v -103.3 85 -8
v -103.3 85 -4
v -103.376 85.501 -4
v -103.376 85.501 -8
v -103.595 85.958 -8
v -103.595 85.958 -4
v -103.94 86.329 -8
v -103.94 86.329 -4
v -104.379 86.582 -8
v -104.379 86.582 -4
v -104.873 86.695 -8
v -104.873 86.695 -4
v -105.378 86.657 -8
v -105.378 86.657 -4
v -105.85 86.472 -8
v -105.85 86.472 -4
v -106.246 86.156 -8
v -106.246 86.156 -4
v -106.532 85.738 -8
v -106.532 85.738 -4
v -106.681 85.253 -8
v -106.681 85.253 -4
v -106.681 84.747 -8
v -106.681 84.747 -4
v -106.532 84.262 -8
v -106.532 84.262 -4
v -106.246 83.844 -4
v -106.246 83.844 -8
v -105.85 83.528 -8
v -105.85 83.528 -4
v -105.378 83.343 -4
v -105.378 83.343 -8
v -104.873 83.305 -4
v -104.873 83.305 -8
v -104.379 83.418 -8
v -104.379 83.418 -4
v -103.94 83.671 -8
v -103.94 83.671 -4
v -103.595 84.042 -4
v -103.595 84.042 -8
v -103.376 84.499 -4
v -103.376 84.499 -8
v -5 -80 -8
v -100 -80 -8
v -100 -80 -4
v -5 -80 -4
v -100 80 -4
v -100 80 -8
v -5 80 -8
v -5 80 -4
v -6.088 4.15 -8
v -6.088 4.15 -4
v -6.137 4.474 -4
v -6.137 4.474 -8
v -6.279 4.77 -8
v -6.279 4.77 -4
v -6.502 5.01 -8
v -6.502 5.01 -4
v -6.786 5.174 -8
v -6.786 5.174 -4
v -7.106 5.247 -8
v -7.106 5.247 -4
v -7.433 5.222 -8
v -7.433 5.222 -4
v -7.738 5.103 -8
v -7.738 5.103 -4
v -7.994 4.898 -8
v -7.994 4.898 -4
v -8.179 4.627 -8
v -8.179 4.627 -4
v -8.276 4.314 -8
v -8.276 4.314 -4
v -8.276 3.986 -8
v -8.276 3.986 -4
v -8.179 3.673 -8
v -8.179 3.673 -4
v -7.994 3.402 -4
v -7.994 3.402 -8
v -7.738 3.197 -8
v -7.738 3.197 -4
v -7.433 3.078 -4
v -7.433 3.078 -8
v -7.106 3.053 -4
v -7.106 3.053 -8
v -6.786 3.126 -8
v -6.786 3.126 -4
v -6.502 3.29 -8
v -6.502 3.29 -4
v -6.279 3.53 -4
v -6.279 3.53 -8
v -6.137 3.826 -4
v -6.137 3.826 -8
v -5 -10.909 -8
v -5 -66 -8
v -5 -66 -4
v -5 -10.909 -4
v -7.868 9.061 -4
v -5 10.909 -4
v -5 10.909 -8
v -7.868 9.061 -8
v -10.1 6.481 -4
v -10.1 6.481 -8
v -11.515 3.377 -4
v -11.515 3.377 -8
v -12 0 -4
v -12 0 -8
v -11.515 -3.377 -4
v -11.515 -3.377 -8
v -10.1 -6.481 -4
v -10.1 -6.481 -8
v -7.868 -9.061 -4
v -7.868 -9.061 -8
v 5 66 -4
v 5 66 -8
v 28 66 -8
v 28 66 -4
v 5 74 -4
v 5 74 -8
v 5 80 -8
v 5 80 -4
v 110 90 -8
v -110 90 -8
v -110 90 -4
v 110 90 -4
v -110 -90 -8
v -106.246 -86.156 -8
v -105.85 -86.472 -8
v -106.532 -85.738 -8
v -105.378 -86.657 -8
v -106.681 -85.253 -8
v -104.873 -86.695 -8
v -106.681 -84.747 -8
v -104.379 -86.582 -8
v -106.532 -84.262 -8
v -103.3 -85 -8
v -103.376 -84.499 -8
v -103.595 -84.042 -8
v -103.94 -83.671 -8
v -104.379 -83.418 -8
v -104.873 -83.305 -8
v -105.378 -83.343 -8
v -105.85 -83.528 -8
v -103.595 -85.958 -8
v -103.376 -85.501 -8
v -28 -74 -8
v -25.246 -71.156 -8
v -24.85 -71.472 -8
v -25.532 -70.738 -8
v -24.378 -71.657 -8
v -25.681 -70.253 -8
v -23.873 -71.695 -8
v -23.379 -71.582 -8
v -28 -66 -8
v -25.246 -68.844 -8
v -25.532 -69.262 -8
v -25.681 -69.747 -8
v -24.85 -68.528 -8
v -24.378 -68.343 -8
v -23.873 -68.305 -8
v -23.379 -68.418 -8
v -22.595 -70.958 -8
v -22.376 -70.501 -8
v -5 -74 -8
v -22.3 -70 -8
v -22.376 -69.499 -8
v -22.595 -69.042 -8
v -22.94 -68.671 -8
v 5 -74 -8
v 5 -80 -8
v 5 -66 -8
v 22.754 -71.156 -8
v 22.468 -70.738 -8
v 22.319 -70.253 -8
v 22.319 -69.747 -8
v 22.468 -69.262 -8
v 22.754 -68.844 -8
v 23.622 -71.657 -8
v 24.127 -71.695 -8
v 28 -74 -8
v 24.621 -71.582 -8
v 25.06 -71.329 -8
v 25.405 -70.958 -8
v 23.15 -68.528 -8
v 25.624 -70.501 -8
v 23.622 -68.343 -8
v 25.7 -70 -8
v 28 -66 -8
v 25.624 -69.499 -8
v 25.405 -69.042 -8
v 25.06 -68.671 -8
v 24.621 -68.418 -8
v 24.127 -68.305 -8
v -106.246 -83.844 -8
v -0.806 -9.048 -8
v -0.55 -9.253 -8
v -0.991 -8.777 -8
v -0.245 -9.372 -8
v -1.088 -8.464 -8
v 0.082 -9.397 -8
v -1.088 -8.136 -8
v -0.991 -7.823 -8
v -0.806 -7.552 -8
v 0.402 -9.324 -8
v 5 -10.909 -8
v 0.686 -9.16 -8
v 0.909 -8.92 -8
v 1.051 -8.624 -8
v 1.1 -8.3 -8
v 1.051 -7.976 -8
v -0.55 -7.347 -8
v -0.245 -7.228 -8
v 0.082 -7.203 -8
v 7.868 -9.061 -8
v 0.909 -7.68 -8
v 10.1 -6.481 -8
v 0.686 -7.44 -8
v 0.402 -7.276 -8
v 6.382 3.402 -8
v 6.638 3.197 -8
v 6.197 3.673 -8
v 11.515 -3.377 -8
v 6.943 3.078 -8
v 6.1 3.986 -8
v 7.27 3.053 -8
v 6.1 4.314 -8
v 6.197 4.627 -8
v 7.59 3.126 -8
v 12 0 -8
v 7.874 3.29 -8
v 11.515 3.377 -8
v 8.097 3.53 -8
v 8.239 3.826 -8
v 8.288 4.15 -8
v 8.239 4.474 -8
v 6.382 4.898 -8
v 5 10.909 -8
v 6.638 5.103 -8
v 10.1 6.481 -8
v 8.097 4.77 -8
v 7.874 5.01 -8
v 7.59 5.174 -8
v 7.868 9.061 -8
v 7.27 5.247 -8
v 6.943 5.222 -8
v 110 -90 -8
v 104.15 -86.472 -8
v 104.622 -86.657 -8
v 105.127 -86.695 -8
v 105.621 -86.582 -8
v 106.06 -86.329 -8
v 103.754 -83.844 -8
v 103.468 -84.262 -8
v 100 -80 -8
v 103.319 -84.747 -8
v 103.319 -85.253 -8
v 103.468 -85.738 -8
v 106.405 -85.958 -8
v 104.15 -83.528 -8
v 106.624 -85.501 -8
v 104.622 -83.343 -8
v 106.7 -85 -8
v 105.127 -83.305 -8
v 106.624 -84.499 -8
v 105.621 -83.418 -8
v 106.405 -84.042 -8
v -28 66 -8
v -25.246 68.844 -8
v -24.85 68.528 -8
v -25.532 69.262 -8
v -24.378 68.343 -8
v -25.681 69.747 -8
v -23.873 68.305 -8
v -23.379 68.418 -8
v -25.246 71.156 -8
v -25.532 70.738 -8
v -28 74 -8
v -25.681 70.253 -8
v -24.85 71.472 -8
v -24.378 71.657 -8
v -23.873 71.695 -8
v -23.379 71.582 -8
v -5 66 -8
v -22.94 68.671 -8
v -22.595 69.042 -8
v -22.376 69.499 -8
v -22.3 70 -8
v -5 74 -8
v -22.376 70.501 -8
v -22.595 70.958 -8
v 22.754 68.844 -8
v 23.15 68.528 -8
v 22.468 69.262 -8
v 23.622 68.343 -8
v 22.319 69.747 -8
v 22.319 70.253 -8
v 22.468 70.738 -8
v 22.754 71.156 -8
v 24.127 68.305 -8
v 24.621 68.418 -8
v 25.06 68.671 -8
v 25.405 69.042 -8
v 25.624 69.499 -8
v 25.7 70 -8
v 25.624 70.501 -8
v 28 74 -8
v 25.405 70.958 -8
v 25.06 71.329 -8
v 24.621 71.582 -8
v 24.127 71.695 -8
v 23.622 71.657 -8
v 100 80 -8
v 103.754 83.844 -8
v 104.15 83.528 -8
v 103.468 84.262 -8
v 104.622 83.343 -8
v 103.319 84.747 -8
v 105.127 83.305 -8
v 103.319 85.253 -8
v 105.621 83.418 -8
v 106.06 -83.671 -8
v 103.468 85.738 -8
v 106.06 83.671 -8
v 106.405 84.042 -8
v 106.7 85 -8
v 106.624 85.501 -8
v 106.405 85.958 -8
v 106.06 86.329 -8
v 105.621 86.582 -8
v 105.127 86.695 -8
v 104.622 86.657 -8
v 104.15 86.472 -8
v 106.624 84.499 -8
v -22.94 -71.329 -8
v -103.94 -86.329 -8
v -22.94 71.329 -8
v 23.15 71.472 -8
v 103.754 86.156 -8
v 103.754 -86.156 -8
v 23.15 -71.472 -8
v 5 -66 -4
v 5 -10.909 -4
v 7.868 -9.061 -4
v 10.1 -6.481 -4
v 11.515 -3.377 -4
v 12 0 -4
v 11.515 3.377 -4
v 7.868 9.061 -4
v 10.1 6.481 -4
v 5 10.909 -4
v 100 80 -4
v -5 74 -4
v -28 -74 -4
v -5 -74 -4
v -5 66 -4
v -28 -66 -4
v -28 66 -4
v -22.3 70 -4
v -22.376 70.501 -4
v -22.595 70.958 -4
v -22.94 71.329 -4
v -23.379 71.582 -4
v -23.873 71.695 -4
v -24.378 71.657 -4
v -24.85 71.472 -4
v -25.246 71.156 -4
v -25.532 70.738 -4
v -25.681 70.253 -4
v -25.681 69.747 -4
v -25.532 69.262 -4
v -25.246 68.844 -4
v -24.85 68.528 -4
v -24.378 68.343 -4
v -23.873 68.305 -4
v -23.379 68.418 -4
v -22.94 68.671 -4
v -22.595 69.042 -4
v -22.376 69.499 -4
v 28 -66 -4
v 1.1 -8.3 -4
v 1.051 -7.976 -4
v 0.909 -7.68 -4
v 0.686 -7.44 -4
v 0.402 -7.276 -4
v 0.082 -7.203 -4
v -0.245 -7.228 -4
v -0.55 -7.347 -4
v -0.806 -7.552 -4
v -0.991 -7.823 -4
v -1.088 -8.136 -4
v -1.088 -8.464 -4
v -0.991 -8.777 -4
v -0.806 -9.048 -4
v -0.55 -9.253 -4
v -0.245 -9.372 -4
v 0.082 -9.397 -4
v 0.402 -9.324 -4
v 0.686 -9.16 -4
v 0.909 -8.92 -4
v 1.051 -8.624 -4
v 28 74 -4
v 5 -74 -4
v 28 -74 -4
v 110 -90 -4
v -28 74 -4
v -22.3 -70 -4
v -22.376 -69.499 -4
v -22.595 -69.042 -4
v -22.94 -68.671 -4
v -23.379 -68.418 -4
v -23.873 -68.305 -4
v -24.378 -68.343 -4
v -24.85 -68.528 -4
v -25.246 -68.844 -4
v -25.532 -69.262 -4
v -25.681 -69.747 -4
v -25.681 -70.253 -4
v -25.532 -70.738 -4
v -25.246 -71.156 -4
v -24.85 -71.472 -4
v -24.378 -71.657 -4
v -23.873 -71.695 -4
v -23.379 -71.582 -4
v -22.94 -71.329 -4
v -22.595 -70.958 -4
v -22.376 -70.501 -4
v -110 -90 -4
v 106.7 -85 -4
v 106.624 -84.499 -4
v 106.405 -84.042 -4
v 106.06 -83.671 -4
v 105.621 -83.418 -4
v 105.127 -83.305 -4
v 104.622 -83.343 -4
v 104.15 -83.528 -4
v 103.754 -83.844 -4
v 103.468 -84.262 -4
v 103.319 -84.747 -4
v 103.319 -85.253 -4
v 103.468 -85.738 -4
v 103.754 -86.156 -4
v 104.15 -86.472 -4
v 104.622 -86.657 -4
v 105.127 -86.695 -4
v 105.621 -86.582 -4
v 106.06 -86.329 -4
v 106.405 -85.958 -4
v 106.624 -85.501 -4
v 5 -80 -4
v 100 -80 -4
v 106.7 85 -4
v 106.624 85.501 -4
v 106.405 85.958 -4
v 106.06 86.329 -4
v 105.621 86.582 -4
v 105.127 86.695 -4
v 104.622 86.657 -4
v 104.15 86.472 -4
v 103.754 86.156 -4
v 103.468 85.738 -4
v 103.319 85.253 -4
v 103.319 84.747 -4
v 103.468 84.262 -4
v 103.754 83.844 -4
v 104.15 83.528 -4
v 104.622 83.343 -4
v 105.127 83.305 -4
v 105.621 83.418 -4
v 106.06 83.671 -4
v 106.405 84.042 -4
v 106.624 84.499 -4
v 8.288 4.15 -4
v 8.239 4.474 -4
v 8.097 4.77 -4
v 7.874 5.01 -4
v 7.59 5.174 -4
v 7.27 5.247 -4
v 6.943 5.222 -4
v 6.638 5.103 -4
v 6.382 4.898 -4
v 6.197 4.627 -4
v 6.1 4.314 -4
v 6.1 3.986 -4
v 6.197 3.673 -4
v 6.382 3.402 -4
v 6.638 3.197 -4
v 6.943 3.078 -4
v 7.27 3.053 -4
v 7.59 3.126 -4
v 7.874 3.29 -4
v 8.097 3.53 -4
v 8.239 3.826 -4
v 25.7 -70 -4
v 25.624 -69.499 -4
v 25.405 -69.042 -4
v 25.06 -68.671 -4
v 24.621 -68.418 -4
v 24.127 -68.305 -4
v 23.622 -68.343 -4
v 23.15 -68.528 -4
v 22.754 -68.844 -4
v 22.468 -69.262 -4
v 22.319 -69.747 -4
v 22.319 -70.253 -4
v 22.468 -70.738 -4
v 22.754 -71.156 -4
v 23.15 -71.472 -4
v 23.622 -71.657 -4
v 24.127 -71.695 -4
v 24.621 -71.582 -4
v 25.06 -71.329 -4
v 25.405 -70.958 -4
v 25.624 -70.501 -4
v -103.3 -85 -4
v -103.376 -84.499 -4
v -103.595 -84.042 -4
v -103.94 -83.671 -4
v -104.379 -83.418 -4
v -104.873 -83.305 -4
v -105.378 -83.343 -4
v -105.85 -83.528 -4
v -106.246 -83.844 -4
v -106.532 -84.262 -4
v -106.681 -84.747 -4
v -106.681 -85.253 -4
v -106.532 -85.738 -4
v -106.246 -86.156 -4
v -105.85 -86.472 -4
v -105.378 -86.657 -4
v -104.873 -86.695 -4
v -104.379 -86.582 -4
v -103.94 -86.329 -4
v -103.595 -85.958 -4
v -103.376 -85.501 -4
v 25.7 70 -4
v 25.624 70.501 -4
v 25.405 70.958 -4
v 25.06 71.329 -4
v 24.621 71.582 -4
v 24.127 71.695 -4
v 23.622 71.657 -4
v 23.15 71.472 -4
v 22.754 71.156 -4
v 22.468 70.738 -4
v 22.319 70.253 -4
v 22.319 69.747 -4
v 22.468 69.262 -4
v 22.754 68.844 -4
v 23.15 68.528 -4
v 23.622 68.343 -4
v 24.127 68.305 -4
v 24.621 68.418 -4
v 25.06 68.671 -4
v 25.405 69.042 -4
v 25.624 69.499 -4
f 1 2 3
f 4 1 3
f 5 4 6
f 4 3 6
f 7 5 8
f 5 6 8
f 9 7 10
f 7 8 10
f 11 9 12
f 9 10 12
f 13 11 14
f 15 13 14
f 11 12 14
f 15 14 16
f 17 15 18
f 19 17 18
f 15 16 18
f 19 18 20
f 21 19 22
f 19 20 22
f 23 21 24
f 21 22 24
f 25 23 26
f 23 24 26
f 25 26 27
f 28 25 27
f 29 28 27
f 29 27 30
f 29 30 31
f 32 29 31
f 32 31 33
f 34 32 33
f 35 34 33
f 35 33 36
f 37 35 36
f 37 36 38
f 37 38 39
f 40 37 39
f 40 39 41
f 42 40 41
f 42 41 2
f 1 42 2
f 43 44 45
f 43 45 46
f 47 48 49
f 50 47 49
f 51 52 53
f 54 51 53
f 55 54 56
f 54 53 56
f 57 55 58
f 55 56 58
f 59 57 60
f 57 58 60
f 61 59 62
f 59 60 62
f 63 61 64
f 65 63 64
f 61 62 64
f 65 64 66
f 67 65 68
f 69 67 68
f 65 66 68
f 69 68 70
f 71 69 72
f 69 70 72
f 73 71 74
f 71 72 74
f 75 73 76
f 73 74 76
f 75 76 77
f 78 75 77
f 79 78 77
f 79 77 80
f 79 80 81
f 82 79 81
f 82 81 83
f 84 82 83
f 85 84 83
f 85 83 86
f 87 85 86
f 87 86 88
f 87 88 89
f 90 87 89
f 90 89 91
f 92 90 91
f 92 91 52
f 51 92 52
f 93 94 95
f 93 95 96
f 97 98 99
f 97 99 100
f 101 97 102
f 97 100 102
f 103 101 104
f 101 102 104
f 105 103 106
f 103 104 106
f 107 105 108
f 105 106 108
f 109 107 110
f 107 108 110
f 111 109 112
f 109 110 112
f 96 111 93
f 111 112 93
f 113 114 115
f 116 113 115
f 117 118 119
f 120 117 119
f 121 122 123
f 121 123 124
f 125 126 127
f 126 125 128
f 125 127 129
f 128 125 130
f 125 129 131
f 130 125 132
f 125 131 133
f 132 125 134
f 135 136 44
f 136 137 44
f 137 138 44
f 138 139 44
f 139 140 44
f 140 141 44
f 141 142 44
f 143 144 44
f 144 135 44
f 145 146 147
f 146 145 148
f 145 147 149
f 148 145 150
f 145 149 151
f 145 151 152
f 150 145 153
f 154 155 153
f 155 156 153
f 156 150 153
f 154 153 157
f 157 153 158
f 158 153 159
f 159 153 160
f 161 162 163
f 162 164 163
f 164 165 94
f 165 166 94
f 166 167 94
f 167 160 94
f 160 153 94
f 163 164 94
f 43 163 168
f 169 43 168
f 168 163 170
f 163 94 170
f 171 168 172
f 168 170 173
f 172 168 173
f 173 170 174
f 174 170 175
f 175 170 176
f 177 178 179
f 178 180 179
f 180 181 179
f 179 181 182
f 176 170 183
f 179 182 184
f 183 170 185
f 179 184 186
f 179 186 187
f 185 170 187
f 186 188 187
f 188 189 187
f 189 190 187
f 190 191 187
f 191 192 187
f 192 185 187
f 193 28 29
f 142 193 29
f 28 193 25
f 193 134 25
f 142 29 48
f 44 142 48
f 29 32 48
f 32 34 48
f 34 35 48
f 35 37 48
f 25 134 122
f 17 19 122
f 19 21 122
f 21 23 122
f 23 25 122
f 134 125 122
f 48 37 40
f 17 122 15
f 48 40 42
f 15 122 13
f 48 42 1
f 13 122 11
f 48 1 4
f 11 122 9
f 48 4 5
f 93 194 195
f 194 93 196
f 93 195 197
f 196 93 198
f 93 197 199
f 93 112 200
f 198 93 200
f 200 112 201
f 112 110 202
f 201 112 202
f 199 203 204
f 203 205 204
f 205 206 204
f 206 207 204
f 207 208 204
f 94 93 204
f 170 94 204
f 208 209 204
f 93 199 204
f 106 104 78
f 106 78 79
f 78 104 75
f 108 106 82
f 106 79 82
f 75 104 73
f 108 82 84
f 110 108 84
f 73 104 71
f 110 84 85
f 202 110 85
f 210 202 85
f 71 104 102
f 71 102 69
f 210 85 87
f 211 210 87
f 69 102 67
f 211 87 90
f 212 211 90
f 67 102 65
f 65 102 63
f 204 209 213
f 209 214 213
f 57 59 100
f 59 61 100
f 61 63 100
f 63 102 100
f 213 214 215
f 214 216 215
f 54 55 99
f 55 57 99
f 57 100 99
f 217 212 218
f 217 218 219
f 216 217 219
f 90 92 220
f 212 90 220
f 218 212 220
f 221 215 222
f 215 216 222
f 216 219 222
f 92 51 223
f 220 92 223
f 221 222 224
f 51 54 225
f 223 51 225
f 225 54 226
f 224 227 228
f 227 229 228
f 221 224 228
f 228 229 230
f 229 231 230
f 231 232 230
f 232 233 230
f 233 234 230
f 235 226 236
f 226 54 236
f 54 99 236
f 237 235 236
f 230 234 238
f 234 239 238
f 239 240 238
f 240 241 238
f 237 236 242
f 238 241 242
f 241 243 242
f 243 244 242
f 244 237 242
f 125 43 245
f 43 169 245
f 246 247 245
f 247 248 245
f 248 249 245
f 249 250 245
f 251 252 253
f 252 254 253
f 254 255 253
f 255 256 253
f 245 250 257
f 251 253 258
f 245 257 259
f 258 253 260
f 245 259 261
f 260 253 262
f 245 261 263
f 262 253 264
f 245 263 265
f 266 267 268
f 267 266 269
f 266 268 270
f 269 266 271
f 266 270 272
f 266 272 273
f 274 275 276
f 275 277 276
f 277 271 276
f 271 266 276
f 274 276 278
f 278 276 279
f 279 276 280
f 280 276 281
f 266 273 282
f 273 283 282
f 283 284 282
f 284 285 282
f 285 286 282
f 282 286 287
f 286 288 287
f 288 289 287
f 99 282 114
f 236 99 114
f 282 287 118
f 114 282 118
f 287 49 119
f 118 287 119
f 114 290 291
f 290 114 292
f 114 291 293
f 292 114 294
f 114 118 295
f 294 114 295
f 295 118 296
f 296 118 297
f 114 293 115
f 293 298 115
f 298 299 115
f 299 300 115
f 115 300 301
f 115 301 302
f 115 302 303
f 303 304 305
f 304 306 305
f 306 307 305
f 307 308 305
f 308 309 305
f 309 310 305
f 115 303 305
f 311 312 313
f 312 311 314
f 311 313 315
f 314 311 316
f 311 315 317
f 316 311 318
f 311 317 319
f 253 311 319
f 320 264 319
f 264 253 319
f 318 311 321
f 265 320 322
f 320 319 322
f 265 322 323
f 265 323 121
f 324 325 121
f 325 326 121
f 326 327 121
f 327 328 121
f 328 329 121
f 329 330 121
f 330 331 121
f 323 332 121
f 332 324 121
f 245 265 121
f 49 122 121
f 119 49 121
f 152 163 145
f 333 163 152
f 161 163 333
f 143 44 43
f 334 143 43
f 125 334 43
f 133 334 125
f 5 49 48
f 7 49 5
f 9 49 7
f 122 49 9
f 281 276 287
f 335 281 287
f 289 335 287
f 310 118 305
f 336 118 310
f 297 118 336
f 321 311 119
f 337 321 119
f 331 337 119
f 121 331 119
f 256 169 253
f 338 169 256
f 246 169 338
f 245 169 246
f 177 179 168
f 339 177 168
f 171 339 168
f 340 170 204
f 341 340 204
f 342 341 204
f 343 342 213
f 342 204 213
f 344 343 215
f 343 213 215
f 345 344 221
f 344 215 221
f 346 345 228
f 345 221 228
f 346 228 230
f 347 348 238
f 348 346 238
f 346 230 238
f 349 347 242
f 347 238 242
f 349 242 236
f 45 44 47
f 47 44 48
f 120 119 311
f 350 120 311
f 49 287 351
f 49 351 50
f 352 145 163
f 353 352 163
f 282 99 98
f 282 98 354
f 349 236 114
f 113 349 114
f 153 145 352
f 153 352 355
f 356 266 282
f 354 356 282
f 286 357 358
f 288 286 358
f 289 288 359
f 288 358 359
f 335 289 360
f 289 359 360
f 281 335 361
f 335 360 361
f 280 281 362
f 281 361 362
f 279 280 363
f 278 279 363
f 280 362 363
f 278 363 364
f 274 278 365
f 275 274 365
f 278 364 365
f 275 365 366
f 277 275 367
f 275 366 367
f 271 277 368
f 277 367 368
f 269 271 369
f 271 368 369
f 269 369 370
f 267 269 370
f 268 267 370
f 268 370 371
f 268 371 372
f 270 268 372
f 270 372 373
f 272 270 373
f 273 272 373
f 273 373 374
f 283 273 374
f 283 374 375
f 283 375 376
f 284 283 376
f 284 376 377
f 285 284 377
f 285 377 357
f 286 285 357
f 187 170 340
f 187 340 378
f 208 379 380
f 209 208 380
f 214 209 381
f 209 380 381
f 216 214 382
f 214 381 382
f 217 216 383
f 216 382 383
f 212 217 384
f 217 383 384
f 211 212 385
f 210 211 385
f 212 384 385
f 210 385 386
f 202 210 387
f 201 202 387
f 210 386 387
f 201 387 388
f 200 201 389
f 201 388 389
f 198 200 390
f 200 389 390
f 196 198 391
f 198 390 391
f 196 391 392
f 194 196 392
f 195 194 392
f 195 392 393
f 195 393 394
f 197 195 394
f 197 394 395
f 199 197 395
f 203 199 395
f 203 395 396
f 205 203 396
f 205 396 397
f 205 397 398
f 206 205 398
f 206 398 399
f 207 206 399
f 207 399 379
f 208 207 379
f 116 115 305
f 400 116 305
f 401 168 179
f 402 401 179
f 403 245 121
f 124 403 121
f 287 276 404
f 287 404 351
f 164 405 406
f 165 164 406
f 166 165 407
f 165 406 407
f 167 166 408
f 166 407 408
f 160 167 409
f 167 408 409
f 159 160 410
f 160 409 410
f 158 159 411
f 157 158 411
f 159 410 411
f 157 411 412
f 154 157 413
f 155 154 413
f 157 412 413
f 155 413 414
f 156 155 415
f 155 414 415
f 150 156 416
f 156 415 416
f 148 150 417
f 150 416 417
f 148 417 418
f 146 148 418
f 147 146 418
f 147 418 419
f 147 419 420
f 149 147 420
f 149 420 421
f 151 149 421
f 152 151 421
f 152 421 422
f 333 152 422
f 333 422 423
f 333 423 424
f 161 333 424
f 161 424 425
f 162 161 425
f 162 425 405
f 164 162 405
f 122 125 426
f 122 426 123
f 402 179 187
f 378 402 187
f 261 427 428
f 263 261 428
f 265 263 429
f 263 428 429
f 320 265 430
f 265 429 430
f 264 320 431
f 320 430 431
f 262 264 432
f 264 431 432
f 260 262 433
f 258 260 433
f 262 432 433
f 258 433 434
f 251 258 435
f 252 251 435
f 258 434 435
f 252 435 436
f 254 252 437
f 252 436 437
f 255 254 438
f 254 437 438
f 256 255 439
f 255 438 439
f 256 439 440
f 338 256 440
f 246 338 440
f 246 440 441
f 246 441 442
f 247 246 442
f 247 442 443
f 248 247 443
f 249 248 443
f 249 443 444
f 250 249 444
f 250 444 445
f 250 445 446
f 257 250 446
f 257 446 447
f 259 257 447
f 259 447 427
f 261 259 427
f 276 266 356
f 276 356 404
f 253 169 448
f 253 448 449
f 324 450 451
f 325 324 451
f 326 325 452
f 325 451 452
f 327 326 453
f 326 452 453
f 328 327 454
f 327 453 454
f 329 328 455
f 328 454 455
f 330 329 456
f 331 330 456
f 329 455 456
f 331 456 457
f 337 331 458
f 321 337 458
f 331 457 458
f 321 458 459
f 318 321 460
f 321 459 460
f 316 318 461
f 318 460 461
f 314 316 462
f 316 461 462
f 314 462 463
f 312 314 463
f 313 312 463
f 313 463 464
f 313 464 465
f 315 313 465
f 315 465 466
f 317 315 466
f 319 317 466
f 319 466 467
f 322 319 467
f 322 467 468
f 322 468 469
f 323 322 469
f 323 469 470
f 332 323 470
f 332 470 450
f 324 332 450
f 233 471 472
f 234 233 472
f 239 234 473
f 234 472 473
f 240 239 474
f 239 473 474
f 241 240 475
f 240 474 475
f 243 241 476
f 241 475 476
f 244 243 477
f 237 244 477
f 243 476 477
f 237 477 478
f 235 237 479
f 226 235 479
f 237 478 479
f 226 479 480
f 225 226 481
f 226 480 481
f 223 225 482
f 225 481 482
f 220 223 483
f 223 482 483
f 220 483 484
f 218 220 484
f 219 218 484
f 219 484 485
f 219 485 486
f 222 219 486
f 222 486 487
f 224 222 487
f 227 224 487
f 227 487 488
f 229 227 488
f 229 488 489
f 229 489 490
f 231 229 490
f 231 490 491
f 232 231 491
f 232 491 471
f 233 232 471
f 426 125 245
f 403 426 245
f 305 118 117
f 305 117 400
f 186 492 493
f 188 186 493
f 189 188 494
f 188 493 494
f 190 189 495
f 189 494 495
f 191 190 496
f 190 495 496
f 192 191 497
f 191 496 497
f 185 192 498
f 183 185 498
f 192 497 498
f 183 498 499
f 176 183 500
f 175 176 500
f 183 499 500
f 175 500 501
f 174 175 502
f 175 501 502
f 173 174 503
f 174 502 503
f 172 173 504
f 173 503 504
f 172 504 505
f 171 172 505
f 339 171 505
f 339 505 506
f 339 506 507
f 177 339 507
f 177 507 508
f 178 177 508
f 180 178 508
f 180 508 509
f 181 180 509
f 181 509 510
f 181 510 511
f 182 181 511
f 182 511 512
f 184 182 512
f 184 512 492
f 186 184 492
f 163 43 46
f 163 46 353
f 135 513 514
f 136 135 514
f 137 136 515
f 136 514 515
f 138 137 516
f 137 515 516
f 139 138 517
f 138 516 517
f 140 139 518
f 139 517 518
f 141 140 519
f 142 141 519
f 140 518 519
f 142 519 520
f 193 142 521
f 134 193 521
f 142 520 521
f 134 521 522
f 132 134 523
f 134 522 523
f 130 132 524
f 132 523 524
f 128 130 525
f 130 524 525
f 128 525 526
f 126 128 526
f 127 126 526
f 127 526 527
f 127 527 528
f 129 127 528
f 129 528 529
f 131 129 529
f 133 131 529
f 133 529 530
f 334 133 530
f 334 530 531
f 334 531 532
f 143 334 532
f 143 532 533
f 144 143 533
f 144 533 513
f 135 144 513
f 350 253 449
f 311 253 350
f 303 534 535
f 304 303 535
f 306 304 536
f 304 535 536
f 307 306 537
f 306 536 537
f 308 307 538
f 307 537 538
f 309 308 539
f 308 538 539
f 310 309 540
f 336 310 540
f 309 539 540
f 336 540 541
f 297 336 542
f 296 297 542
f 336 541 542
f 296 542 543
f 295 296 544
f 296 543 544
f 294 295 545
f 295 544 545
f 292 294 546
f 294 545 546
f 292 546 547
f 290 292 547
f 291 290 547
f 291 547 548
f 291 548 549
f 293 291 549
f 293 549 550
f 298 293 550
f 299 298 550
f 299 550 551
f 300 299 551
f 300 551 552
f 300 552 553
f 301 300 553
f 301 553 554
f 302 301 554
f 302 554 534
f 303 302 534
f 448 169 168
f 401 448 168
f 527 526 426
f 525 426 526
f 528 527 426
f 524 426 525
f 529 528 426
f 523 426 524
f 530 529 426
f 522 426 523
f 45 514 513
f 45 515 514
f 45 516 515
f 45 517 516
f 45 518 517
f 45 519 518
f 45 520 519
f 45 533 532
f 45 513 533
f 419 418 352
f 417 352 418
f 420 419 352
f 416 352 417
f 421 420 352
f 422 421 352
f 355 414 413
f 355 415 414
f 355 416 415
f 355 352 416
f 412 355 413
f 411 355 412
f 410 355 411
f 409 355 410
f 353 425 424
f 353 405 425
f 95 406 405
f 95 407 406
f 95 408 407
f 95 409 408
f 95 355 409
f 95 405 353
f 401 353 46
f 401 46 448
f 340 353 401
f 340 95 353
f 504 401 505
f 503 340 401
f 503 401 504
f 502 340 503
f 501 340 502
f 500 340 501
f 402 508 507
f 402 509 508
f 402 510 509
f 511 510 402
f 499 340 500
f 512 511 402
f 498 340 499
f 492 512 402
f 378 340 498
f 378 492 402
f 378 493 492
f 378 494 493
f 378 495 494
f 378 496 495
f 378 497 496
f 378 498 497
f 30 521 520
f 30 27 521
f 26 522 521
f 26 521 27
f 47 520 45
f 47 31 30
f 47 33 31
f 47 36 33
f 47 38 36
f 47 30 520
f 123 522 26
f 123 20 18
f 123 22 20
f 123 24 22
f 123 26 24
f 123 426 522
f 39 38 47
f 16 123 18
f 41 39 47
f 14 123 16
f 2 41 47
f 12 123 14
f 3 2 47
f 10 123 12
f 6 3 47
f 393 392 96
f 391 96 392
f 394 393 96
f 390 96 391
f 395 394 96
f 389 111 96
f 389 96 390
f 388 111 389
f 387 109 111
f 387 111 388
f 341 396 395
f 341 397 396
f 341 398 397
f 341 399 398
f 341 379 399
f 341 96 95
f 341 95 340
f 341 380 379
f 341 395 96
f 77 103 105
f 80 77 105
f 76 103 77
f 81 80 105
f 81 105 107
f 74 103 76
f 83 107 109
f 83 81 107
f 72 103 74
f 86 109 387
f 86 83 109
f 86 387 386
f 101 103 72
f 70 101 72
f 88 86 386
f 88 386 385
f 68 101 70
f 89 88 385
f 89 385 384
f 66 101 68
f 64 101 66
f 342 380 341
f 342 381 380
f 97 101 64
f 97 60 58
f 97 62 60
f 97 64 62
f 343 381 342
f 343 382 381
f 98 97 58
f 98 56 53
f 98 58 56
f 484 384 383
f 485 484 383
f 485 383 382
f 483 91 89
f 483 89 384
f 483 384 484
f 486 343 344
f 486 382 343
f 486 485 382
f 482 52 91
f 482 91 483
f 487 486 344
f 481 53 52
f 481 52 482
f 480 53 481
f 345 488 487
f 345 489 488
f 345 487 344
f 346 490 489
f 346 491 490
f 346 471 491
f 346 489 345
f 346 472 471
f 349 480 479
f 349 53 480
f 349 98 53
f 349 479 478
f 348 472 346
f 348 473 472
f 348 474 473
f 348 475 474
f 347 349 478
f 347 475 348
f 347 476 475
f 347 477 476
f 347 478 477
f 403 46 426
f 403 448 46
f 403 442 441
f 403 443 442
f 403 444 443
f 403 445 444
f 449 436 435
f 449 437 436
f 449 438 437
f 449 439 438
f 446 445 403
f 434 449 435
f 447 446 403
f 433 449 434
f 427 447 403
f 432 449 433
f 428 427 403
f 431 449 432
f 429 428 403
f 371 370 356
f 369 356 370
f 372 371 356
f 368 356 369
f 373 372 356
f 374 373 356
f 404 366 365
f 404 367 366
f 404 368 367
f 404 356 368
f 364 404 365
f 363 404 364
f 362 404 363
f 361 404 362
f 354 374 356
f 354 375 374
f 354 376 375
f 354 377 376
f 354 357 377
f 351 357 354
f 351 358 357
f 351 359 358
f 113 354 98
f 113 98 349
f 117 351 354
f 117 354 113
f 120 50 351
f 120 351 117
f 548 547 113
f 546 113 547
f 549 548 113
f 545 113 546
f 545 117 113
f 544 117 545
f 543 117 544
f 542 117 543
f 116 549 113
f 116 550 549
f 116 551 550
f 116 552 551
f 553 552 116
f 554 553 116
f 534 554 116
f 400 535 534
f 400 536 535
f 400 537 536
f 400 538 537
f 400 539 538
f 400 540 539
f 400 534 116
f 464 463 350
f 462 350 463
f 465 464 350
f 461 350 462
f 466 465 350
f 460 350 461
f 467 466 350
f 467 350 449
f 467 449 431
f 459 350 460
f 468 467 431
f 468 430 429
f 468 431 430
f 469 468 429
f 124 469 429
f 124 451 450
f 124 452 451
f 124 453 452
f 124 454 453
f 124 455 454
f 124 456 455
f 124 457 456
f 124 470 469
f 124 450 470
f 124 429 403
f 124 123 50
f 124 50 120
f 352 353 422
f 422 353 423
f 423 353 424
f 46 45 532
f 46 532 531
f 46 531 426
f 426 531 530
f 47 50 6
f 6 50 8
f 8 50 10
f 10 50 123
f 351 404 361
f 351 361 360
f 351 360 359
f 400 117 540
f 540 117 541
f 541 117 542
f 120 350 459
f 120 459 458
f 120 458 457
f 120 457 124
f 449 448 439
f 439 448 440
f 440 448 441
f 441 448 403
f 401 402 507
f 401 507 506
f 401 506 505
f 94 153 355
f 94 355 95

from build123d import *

# Parameters (mm, degrees)
LOWER_PERIMETER_START             = -8
SKETCH1_W                         = 220
SKETCH1_H                         = 180
SKETCH1_W_2                       = 200
SKETCH1_H_2                       = 160
LOWER_PERIMETER_DEPTH             = 4
CENTRE_SPINE_START                = -8
SKETCH2_W                         = 10
SKETCH2_H                         = 170
CENTRE_SPINE_DEPTH                = 4
PEDESTAL_LANDING_START            = -8
SKETCH3_R                         = 12
PEDESTAL_LANDING_DEPTH            = 4
BASE_LANDING_70_START             = -8
SKETCH4_W                         = 56
SKETCH4_H                         = 8
BASE_LANDING_70_DEPTH             = 4
SKETCH5_W                         = 56
SKETCH5_H                         = 8
BASE_LANDING_70_2_DEPTH           = 4
SKETCH6_R                         = 1.7
EIGHT_M3_CLEARANCE_DEPTH          = 4.01
SKETCH7_R                         = 1.1
PEDESTAL_THREE_M2_CLEARANCE_DEPTH = 4.01


with BuildPart() as part:
    # Sketch1 → Lower_Perimeter (new body)
    with BuildSketch(Plane.XY.offset(LOWER_PERIMETER_START)):
        Rectangle(SKETCH1_W, SKETCH1_H)
        Rectangle(SKETCH1_W_2, SKETCH1_H_2, mode=Mode.SUBTRACT)
    extrude(amount=LOWER_PERIMETER_DEPTH)

    # Sketch2 → Centre_Spine (add)
    with BuildSketch(Plane.XY.offset(CENTRE_SPINE_START)):
        Rectangle(SKETCH2_W, SKETCH2_H)
    extrude(amount=CENTRE_SPINE_DEPTH)

    # Sketch3 → Pedestal_Landing (add)
    with BuildSketch(Plane.XY.offset(PEDESTAL_LANDING_START)):
        Circle(SKETCH3_R)
    extrude(amount=PEDESTAL_LANDING_DEPTH)

    # Sketch4 → Base_Landing_-70 (add)
    with BuildSketch(Plane.XY.offset(BASE_LANDING_70_START)):
        with Locations((0, -70)):
            Rectangle(SKETCH4_W, SKETCH4_H)
    extrude(amount=BASE_LANDING_70_DEPTH)

    # Sketch5 → Base_Landing_70 2 (add)
    with BuildSketch(Plane.XY.offset(BASE_LANDING_70_START)):
        with Locations((0, 70)):
            Rectangle(SKETCH5_W, SKETCH5_H)
    extrude(amount=BASE_LANDING_70_2_DEPTH)

    # Sketch6 → Eight_M3_Clearance (cut)
    with BuildSketch(Plane.XY.offset(-4)):
        with Locations((-105, -85)):
            Circle(SKETCH6_R)
        with Locations((-105, 85)):
            Circle(SKETCH6_R)
        with Locations((105, -85)):
            Circle(SKETCH6_R)
        with Locations((105, 85)):
            Circle(SKETCH6_R)
        with Locations((-24, -70)):
            Circle(SKETCH6_R)
        with Locations((-24, 70)):
            Circle(SKETCH6_R)
        with Locations((24, -70)):
            Circle(SKETCH6_R)
        with Locations((24, 70)):
            Circle(SKETCH6_R)
    extrude(amount=-EIGHT_M3_CLEARANCE_DEPTH, mode=Mode.SUBTRACT)

    # Sketch7 → Pedestal_Three_M2_Clearance (cut)
    with BuildSketch(Plane.XY.offset(-4)):
        with Locations((7.188010851, 4.15)):
            Circle(SKETCH7_R)
        with Locations((-7.188010851, 4.15)):
            Circle(SKETCH7_R)
        with Locations((0, -8.3)):
            Circle(SKETCH7_R)
    extrude(amount=-PEDESTAL_THREE_M2_CLEARANCE_DEPTH, mode=Mode.SUBTRACT)


solid = part.part
